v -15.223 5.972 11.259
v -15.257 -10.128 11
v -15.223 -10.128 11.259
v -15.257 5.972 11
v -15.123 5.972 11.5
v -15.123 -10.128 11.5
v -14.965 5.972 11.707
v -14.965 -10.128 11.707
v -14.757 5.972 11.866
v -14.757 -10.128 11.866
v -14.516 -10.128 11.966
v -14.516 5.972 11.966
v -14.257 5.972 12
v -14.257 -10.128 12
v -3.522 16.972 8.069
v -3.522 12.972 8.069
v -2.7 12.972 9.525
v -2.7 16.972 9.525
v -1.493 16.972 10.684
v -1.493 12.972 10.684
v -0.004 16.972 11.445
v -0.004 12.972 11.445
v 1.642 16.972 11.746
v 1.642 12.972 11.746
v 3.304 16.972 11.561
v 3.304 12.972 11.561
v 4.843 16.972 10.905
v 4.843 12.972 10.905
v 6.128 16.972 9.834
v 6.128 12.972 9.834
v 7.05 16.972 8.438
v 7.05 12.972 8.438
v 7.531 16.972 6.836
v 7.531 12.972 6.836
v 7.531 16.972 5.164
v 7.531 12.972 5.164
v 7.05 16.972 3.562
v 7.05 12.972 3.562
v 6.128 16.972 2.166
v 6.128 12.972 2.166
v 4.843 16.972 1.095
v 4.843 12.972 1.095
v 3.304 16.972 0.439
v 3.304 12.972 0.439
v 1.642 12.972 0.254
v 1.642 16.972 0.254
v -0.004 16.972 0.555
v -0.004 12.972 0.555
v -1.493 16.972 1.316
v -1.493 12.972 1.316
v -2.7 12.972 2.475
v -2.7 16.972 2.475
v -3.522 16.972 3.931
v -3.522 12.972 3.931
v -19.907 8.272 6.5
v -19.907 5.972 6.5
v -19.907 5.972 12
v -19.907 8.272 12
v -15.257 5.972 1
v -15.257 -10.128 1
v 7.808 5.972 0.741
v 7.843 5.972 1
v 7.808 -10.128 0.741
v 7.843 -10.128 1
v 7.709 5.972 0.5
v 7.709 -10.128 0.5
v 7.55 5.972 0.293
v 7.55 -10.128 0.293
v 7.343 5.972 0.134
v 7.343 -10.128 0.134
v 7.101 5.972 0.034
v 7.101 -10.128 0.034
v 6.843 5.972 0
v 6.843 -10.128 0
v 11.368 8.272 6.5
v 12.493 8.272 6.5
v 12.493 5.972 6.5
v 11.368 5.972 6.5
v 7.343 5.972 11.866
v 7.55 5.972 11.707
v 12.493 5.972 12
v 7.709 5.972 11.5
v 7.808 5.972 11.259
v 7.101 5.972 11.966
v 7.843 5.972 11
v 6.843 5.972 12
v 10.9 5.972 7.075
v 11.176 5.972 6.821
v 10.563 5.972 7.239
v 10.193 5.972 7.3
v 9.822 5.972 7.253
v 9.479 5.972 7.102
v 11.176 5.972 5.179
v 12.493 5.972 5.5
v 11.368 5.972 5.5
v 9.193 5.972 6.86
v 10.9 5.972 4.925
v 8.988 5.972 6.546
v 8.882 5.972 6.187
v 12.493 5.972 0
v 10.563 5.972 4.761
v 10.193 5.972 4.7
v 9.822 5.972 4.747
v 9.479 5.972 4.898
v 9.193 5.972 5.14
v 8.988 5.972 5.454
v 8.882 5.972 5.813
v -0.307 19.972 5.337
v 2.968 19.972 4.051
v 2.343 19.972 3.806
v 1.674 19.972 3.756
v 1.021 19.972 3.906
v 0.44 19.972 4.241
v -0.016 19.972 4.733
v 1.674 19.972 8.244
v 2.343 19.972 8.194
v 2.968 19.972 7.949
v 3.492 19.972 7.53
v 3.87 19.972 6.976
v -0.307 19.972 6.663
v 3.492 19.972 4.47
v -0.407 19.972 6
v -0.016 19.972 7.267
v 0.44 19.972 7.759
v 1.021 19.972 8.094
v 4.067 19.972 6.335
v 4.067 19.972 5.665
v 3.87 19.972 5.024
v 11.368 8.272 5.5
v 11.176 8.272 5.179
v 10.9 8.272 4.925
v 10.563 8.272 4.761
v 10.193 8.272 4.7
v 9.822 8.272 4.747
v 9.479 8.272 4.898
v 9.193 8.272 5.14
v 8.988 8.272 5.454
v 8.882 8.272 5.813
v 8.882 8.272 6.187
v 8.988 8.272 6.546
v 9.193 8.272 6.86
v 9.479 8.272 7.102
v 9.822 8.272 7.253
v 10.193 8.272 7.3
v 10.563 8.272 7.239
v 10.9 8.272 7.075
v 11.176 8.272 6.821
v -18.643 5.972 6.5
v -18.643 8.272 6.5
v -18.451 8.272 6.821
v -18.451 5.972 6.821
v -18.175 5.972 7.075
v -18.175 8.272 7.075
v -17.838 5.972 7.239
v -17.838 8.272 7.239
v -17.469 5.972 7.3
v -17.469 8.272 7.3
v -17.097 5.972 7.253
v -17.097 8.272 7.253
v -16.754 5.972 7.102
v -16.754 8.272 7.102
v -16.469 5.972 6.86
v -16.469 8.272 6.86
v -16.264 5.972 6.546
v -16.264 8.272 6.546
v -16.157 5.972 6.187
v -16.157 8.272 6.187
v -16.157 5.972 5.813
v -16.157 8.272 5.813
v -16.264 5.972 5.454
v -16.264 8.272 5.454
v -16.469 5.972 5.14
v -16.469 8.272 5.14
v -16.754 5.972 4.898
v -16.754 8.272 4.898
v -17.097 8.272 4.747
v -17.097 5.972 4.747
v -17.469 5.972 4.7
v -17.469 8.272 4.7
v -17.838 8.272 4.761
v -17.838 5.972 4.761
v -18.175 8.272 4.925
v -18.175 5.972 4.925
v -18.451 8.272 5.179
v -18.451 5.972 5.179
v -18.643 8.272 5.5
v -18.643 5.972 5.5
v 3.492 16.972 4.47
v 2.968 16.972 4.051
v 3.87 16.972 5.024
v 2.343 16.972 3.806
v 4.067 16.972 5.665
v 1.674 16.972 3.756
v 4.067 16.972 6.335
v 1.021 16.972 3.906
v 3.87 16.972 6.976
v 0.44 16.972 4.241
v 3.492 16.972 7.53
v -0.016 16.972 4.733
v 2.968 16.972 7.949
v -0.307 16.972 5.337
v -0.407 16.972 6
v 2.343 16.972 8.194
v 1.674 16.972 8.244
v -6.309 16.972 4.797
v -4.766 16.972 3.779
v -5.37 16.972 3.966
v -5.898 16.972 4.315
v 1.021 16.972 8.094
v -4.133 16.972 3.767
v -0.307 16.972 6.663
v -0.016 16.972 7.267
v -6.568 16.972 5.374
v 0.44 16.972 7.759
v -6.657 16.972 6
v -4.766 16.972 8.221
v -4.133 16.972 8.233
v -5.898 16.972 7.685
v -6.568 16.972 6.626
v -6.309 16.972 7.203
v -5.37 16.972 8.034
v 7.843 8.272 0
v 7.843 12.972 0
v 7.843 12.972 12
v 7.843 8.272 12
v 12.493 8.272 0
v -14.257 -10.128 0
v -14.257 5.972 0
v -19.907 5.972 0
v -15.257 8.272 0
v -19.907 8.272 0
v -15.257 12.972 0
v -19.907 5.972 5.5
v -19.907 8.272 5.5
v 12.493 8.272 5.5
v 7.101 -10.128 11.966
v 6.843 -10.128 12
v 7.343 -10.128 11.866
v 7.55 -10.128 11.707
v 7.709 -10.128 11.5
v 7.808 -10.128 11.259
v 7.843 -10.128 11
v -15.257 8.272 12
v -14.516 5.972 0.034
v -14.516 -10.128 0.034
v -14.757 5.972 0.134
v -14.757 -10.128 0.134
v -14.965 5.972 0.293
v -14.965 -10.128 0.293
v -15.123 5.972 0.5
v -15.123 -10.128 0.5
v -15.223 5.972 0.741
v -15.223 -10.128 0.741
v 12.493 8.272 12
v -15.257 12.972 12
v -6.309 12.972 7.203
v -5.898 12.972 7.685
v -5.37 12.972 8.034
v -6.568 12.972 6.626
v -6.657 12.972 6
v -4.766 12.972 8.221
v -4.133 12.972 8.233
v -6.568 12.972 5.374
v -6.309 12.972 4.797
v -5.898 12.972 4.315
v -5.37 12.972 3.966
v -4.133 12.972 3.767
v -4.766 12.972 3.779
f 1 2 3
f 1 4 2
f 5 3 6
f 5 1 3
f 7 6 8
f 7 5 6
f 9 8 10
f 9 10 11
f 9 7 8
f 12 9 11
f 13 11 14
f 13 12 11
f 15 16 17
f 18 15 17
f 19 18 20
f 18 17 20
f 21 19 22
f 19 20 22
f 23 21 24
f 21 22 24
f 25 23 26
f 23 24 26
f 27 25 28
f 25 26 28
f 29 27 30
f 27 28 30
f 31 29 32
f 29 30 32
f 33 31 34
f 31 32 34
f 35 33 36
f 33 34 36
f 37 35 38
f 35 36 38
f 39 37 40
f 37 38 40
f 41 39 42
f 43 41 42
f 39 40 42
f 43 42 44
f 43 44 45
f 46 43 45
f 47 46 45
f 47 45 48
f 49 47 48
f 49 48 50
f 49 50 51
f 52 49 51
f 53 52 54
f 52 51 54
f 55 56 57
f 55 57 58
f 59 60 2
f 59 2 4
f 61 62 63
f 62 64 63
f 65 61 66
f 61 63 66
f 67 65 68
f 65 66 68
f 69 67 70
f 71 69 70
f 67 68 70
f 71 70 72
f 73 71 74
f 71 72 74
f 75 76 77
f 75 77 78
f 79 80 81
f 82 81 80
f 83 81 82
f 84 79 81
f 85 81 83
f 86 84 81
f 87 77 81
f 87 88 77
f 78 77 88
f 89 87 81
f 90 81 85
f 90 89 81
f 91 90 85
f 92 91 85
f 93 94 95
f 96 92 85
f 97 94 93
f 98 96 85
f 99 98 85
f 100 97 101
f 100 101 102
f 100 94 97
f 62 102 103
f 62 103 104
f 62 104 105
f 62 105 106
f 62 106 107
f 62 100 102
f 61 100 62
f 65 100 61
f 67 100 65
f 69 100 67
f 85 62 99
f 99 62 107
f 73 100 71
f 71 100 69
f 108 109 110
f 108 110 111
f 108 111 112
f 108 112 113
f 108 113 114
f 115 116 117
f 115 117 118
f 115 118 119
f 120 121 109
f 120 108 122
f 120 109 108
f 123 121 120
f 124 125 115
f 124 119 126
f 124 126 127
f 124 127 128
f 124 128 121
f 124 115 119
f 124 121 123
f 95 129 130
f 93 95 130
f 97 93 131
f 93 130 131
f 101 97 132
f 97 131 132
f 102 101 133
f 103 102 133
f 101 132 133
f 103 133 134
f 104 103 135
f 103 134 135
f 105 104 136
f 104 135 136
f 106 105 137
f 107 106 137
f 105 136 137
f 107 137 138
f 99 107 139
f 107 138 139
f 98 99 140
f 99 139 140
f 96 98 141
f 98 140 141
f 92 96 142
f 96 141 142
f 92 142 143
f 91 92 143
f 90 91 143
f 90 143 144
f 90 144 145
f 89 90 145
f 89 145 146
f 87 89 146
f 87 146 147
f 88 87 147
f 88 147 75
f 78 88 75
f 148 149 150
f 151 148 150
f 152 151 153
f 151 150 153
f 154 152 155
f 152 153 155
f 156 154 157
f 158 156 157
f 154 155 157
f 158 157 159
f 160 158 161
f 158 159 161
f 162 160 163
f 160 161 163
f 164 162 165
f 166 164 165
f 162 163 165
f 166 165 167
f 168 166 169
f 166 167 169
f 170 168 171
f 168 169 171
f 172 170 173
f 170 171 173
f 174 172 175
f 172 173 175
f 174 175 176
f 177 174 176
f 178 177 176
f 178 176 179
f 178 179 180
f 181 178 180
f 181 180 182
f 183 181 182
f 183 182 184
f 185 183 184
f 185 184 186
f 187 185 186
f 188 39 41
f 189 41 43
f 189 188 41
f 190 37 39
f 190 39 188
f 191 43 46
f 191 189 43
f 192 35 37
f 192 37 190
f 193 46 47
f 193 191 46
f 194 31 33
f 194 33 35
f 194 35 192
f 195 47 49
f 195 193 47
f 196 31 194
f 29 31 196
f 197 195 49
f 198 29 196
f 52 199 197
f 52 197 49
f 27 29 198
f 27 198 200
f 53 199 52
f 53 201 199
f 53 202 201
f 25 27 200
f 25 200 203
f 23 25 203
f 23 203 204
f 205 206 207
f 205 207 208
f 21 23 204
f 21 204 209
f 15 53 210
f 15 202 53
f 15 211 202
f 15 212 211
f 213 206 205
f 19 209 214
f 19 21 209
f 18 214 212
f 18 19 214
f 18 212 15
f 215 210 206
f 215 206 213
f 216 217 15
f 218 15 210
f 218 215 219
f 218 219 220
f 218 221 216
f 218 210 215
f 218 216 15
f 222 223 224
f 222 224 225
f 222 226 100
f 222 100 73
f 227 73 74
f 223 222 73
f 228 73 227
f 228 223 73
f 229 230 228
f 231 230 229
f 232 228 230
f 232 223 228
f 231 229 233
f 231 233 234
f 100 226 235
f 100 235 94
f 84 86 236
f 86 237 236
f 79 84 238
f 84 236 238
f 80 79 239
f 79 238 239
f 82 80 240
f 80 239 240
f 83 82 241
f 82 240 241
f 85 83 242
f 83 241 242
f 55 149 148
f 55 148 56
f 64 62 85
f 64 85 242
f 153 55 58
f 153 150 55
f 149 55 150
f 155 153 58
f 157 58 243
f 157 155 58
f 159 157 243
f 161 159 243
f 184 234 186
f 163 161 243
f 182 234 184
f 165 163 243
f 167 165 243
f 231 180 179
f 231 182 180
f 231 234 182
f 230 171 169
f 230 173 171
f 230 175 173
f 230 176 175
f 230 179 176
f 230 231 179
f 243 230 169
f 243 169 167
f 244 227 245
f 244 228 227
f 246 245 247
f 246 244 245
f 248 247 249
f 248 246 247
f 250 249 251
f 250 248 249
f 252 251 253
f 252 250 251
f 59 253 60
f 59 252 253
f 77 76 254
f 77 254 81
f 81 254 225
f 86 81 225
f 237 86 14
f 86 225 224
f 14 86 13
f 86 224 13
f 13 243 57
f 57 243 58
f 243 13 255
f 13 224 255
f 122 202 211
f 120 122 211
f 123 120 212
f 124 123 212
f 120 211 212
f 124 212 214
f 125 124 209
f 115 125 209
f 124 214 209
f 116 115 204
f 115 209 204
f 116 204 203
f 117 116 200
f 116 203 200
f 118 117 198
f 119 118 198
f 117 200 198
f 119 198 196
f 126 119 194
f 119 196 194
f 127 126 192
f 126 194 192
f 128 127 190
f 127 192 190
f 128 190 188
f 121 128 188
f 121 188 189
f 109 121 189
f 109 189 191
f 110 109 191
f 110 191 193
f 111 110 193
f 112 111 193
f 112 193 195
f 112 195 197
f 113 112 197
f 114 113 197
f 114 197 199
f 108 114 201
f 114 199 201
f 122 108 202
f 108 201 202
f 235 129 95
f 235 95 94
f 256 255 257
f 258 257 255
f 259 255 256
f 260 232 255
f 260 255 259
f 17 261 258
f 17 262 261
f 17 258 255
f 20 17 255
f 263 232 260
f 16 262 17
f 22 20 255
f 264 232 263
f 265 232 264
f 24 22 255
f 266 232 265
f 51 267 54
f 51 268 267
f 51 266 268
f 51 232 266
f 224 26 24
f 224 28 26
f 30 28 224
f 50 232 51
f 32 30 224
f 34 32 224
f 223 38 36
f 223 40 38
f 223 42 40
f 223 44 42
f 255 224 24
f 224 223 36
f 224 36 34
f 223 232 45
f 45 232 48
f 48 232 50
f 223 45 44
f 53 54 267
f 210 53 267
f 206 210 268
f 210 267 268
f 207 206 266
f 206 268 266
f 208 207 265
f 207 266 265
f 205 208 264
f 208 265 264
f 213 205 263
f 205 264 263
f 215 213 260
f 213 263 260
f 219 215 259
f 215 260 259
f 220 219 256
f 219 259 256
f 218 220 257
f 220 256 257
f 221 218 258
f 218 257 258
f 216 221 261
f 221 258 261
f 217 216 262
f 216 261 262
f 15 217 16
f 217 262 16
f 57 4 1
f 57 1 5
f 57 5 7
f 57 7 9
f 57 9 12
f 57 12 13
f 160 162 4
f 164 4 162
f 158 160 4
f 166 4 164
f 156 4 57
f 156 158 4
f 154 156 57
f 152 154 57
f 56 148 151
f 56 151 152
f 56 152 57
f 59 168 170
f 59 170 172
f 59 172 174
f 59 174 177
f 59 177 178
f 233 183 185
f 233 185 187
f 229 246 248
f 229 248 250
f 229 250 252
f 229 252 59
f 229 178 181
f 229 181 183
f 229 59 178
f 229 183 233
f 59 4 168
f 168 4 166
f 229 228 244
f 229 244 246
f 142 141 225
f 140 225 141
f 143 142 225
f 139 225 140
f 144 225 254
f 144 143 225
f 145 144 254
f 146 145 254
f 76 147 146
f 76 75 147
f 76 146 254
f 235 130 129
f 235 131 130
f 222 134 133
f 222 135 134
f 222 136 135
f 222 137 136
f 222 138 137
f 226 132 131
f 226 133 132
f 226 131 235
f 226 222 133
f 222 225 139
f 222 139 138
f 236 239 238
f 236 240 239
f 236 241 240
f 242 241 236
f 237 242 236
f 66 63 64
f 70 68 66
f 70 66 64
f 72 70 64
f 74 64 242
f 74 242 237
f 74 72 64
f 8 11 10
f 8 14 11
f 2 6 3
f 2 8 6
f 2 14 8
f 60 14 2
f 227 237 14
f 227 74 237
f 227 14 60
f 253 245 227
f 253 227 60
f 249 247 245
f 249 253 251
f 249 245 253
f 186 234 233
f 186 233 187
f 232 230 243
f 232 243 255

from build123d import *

# Parameters (mm, degrees)
PAD_DEPTH       = 12
FILLET_R        = 1
FILLET001_R     = 1
FILLET002_R     = 1
FILLET003_R     = 1
POCKET_DEPTH    = 5
PAD001_DEPTH    = 4
SKETCH004_R     = 2.25
PAD002_DEPTH    = 3
POCKET001_DEPTH = 5


with BuildPart() as part:
    # Sketch → Pad (new body)
    with BuildSketch(Plane.XY):
        Polygon((-15.25744, 12.972063), (7.84256, 12.972063), (7.84256, 8.272063), (12.49256, 8.272063), (12.49256, 5.972063), (7.84256, 5.972063), (7.84256, -10.127937), (-15.25744, -10.127937), (-15.25744, 5.972063), (-19.90744, 5.972063), (-19.90744, 8.272063), (-15.25744, 8.272063), align=None)
    extrude(amount=PAD_DEPTH)

    # Fillet
    fillet_edges = [part.edges().sort_by_distance(p)[0] for p in [
        (-15.25744, -2.077937, 12),
    ]]
    fillet(fillet_edges, radius=FILLET_R)

    # Fillet001
    fillet001_edges = [part.edges().sort_by_distance(p)[0] for p in [
        (-15.25744, -2.077937, 0),
    ]]
    fillet(fillet001_edges, radius=FILLET001_R)

    # Fillet002
    fillet002_edges = [part.edges().sort_by_distance(p)[0] for p in [
        (7.84256, -2.077937, 0),
    ]]
    fillet(fillet002_edges, radius=FILLET002_R)

    # Fillet003
    fillet003_edges = [part.edges().sort_by_distance(p)[0] for p in [
        (7.84256, -2.077937, 12),
    ]]
    fillet(fillet003_edges, radius=FILLET003_R)

    # Sketch001 → Pocket (cut)
    with BuildSketch(Plane(origin=(0, 8.272063, 0), x_dir=(-1, 0, 0), z_dir=(0, 1, 0))):
        with BuildLine():
            ThreePointArc((-11.368116, 5.5), (-8.868116, 6), (-11.368116, 6.5))
            Line((-12.49256, 6.5), (-11.368116, 6.5))
            Line((-12.49256, 5.5), (-12.49256, 6.5))
            Line((-11.368116, 5.5), (-12.49256, 5.5))
        make_face()
    extrude(amount=-POCKET_DEPTH, mode=Mode.SUBTRACT)

    # Sketch003 → Pad001 (new body)
    with BuildSketch(Plane(origin=(0, 12.972063, 0), x_dir=(-1, 0, 0), z_dir=(0, 1, 0))):
        with BuildLine():
            ThreePointArc((3.52244, 8.068641), (-7.59256, 6), (3.52244, 3.931359))
            ThreePointArc((3.52244, 3.931359), (6.65744, 6), (3.52244, 8.068641))
        make_face()
    extrude(amount=PAD001_DEPTH)

    # Sketch004 → Pad002 (new body)
    with BuildSketch(Plane(origin=(0, 16.972063, 0), x_dir=(-1, 0, 0), z_dir=(0, 1, 0))):
        with Locations((-1.84256, 6)):
            Circle(SKETCH004_R)
    extrude(amount=PAD002_DEPTH)

    # Sketch005 → Pocket001 (cut)
    with BuildSketch(Plane(origin=(0, 8.272063, 0), x_dir=(-1, 0, 0), z_dir=(0, 1, 0))):
        with BuildLine():
            ThreePointArc((18.643443, 6.5), (16.143443, 6), (18.643443, 5.5))
            Line((19.90744, 5.5), (18.643443, 5.5))
            Line((19.90744, 6.5), (19.90744, 5.5))
            Line((18.643443, 6.5), (19.90744, 6.5))
        make_face()
    extrude(amount=-POCKET001_DEPTH, mode=Mode.SUBTRACT)


solid = part.part
